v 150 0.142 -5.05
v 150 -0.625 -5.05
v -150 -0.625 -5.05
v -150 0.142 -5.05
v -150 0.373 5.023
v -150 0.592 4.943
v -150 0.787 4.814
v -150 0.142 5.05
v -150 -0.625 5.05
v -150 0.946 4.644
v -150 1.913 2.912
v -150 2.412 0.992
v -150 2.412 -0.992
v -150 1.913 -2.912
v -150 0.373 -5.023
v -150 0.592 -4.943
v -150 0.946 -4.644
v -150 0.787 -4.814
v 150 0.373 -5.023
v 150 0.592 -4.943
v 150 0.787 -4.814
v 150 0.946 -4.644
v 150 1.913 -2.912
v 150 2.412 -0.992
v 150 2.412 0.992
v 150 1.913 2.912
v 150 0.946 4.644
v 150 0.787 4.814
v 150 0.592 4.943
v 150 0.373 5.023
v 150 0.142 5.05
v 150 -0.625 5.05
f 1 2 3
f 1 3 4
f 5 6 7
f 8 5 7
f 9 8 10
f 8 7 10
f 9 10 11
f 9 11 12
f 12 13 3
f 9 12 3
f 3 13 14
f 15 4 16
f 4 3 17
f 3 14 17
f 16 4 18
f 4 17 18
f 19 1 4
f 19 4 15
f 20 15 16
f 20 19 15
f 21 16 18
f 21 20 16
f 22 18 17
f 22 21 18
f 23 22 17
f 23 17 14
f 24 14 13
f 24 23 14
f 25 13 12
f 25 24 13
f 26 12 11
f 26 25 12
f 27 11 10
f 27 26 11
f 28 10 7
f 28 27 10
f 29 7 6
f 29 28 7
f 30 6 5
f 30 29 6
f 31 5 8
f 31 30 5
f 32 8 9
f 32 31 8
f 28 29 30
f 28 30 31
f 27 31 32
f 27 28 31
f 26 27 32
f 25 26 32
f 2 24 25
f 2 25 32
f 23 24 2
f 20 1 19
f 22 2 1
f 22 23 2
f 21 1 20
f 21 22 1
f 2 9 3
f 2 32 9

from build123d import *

# Parameters (mm, degrees)
BOSS_EXTRUDE1_DEPTH = 150


with BuildPart() as part:
    # Sketch1 → Boss-Extrude1 (new body, symmetric)
    with BuildSketch(Plane(origin=(0, 0, 0), x_dir=(0, 0, -1), z_dir=(1, 0, 0))):
        with BuildLine():
            Line((-5.05, -0.625), (5.05, -0.625))
            Line((5.05, -0.625), (5.05, 0.141657769))
            ThreePointArc((5.05, 0.141657769), (4.942763552, 0.592183285), (4.644053518, 0.946083289))
            ThreePointArc((4.644053518, 0.946083289), (0, 2.475), (-4.644053518, 0.946083289))
            ThreePointArc((-4.644053518, 0.946083289), (-4.942763552, 0.592183285), (-5.05, 0.141657769))
            Line((-5.05, 0.141657769), (-5.05, -0.625))
        make_face()
    extrude(amount=BOSS_EXTRUDE1_DEPTH, both=True)


solid = part.part
